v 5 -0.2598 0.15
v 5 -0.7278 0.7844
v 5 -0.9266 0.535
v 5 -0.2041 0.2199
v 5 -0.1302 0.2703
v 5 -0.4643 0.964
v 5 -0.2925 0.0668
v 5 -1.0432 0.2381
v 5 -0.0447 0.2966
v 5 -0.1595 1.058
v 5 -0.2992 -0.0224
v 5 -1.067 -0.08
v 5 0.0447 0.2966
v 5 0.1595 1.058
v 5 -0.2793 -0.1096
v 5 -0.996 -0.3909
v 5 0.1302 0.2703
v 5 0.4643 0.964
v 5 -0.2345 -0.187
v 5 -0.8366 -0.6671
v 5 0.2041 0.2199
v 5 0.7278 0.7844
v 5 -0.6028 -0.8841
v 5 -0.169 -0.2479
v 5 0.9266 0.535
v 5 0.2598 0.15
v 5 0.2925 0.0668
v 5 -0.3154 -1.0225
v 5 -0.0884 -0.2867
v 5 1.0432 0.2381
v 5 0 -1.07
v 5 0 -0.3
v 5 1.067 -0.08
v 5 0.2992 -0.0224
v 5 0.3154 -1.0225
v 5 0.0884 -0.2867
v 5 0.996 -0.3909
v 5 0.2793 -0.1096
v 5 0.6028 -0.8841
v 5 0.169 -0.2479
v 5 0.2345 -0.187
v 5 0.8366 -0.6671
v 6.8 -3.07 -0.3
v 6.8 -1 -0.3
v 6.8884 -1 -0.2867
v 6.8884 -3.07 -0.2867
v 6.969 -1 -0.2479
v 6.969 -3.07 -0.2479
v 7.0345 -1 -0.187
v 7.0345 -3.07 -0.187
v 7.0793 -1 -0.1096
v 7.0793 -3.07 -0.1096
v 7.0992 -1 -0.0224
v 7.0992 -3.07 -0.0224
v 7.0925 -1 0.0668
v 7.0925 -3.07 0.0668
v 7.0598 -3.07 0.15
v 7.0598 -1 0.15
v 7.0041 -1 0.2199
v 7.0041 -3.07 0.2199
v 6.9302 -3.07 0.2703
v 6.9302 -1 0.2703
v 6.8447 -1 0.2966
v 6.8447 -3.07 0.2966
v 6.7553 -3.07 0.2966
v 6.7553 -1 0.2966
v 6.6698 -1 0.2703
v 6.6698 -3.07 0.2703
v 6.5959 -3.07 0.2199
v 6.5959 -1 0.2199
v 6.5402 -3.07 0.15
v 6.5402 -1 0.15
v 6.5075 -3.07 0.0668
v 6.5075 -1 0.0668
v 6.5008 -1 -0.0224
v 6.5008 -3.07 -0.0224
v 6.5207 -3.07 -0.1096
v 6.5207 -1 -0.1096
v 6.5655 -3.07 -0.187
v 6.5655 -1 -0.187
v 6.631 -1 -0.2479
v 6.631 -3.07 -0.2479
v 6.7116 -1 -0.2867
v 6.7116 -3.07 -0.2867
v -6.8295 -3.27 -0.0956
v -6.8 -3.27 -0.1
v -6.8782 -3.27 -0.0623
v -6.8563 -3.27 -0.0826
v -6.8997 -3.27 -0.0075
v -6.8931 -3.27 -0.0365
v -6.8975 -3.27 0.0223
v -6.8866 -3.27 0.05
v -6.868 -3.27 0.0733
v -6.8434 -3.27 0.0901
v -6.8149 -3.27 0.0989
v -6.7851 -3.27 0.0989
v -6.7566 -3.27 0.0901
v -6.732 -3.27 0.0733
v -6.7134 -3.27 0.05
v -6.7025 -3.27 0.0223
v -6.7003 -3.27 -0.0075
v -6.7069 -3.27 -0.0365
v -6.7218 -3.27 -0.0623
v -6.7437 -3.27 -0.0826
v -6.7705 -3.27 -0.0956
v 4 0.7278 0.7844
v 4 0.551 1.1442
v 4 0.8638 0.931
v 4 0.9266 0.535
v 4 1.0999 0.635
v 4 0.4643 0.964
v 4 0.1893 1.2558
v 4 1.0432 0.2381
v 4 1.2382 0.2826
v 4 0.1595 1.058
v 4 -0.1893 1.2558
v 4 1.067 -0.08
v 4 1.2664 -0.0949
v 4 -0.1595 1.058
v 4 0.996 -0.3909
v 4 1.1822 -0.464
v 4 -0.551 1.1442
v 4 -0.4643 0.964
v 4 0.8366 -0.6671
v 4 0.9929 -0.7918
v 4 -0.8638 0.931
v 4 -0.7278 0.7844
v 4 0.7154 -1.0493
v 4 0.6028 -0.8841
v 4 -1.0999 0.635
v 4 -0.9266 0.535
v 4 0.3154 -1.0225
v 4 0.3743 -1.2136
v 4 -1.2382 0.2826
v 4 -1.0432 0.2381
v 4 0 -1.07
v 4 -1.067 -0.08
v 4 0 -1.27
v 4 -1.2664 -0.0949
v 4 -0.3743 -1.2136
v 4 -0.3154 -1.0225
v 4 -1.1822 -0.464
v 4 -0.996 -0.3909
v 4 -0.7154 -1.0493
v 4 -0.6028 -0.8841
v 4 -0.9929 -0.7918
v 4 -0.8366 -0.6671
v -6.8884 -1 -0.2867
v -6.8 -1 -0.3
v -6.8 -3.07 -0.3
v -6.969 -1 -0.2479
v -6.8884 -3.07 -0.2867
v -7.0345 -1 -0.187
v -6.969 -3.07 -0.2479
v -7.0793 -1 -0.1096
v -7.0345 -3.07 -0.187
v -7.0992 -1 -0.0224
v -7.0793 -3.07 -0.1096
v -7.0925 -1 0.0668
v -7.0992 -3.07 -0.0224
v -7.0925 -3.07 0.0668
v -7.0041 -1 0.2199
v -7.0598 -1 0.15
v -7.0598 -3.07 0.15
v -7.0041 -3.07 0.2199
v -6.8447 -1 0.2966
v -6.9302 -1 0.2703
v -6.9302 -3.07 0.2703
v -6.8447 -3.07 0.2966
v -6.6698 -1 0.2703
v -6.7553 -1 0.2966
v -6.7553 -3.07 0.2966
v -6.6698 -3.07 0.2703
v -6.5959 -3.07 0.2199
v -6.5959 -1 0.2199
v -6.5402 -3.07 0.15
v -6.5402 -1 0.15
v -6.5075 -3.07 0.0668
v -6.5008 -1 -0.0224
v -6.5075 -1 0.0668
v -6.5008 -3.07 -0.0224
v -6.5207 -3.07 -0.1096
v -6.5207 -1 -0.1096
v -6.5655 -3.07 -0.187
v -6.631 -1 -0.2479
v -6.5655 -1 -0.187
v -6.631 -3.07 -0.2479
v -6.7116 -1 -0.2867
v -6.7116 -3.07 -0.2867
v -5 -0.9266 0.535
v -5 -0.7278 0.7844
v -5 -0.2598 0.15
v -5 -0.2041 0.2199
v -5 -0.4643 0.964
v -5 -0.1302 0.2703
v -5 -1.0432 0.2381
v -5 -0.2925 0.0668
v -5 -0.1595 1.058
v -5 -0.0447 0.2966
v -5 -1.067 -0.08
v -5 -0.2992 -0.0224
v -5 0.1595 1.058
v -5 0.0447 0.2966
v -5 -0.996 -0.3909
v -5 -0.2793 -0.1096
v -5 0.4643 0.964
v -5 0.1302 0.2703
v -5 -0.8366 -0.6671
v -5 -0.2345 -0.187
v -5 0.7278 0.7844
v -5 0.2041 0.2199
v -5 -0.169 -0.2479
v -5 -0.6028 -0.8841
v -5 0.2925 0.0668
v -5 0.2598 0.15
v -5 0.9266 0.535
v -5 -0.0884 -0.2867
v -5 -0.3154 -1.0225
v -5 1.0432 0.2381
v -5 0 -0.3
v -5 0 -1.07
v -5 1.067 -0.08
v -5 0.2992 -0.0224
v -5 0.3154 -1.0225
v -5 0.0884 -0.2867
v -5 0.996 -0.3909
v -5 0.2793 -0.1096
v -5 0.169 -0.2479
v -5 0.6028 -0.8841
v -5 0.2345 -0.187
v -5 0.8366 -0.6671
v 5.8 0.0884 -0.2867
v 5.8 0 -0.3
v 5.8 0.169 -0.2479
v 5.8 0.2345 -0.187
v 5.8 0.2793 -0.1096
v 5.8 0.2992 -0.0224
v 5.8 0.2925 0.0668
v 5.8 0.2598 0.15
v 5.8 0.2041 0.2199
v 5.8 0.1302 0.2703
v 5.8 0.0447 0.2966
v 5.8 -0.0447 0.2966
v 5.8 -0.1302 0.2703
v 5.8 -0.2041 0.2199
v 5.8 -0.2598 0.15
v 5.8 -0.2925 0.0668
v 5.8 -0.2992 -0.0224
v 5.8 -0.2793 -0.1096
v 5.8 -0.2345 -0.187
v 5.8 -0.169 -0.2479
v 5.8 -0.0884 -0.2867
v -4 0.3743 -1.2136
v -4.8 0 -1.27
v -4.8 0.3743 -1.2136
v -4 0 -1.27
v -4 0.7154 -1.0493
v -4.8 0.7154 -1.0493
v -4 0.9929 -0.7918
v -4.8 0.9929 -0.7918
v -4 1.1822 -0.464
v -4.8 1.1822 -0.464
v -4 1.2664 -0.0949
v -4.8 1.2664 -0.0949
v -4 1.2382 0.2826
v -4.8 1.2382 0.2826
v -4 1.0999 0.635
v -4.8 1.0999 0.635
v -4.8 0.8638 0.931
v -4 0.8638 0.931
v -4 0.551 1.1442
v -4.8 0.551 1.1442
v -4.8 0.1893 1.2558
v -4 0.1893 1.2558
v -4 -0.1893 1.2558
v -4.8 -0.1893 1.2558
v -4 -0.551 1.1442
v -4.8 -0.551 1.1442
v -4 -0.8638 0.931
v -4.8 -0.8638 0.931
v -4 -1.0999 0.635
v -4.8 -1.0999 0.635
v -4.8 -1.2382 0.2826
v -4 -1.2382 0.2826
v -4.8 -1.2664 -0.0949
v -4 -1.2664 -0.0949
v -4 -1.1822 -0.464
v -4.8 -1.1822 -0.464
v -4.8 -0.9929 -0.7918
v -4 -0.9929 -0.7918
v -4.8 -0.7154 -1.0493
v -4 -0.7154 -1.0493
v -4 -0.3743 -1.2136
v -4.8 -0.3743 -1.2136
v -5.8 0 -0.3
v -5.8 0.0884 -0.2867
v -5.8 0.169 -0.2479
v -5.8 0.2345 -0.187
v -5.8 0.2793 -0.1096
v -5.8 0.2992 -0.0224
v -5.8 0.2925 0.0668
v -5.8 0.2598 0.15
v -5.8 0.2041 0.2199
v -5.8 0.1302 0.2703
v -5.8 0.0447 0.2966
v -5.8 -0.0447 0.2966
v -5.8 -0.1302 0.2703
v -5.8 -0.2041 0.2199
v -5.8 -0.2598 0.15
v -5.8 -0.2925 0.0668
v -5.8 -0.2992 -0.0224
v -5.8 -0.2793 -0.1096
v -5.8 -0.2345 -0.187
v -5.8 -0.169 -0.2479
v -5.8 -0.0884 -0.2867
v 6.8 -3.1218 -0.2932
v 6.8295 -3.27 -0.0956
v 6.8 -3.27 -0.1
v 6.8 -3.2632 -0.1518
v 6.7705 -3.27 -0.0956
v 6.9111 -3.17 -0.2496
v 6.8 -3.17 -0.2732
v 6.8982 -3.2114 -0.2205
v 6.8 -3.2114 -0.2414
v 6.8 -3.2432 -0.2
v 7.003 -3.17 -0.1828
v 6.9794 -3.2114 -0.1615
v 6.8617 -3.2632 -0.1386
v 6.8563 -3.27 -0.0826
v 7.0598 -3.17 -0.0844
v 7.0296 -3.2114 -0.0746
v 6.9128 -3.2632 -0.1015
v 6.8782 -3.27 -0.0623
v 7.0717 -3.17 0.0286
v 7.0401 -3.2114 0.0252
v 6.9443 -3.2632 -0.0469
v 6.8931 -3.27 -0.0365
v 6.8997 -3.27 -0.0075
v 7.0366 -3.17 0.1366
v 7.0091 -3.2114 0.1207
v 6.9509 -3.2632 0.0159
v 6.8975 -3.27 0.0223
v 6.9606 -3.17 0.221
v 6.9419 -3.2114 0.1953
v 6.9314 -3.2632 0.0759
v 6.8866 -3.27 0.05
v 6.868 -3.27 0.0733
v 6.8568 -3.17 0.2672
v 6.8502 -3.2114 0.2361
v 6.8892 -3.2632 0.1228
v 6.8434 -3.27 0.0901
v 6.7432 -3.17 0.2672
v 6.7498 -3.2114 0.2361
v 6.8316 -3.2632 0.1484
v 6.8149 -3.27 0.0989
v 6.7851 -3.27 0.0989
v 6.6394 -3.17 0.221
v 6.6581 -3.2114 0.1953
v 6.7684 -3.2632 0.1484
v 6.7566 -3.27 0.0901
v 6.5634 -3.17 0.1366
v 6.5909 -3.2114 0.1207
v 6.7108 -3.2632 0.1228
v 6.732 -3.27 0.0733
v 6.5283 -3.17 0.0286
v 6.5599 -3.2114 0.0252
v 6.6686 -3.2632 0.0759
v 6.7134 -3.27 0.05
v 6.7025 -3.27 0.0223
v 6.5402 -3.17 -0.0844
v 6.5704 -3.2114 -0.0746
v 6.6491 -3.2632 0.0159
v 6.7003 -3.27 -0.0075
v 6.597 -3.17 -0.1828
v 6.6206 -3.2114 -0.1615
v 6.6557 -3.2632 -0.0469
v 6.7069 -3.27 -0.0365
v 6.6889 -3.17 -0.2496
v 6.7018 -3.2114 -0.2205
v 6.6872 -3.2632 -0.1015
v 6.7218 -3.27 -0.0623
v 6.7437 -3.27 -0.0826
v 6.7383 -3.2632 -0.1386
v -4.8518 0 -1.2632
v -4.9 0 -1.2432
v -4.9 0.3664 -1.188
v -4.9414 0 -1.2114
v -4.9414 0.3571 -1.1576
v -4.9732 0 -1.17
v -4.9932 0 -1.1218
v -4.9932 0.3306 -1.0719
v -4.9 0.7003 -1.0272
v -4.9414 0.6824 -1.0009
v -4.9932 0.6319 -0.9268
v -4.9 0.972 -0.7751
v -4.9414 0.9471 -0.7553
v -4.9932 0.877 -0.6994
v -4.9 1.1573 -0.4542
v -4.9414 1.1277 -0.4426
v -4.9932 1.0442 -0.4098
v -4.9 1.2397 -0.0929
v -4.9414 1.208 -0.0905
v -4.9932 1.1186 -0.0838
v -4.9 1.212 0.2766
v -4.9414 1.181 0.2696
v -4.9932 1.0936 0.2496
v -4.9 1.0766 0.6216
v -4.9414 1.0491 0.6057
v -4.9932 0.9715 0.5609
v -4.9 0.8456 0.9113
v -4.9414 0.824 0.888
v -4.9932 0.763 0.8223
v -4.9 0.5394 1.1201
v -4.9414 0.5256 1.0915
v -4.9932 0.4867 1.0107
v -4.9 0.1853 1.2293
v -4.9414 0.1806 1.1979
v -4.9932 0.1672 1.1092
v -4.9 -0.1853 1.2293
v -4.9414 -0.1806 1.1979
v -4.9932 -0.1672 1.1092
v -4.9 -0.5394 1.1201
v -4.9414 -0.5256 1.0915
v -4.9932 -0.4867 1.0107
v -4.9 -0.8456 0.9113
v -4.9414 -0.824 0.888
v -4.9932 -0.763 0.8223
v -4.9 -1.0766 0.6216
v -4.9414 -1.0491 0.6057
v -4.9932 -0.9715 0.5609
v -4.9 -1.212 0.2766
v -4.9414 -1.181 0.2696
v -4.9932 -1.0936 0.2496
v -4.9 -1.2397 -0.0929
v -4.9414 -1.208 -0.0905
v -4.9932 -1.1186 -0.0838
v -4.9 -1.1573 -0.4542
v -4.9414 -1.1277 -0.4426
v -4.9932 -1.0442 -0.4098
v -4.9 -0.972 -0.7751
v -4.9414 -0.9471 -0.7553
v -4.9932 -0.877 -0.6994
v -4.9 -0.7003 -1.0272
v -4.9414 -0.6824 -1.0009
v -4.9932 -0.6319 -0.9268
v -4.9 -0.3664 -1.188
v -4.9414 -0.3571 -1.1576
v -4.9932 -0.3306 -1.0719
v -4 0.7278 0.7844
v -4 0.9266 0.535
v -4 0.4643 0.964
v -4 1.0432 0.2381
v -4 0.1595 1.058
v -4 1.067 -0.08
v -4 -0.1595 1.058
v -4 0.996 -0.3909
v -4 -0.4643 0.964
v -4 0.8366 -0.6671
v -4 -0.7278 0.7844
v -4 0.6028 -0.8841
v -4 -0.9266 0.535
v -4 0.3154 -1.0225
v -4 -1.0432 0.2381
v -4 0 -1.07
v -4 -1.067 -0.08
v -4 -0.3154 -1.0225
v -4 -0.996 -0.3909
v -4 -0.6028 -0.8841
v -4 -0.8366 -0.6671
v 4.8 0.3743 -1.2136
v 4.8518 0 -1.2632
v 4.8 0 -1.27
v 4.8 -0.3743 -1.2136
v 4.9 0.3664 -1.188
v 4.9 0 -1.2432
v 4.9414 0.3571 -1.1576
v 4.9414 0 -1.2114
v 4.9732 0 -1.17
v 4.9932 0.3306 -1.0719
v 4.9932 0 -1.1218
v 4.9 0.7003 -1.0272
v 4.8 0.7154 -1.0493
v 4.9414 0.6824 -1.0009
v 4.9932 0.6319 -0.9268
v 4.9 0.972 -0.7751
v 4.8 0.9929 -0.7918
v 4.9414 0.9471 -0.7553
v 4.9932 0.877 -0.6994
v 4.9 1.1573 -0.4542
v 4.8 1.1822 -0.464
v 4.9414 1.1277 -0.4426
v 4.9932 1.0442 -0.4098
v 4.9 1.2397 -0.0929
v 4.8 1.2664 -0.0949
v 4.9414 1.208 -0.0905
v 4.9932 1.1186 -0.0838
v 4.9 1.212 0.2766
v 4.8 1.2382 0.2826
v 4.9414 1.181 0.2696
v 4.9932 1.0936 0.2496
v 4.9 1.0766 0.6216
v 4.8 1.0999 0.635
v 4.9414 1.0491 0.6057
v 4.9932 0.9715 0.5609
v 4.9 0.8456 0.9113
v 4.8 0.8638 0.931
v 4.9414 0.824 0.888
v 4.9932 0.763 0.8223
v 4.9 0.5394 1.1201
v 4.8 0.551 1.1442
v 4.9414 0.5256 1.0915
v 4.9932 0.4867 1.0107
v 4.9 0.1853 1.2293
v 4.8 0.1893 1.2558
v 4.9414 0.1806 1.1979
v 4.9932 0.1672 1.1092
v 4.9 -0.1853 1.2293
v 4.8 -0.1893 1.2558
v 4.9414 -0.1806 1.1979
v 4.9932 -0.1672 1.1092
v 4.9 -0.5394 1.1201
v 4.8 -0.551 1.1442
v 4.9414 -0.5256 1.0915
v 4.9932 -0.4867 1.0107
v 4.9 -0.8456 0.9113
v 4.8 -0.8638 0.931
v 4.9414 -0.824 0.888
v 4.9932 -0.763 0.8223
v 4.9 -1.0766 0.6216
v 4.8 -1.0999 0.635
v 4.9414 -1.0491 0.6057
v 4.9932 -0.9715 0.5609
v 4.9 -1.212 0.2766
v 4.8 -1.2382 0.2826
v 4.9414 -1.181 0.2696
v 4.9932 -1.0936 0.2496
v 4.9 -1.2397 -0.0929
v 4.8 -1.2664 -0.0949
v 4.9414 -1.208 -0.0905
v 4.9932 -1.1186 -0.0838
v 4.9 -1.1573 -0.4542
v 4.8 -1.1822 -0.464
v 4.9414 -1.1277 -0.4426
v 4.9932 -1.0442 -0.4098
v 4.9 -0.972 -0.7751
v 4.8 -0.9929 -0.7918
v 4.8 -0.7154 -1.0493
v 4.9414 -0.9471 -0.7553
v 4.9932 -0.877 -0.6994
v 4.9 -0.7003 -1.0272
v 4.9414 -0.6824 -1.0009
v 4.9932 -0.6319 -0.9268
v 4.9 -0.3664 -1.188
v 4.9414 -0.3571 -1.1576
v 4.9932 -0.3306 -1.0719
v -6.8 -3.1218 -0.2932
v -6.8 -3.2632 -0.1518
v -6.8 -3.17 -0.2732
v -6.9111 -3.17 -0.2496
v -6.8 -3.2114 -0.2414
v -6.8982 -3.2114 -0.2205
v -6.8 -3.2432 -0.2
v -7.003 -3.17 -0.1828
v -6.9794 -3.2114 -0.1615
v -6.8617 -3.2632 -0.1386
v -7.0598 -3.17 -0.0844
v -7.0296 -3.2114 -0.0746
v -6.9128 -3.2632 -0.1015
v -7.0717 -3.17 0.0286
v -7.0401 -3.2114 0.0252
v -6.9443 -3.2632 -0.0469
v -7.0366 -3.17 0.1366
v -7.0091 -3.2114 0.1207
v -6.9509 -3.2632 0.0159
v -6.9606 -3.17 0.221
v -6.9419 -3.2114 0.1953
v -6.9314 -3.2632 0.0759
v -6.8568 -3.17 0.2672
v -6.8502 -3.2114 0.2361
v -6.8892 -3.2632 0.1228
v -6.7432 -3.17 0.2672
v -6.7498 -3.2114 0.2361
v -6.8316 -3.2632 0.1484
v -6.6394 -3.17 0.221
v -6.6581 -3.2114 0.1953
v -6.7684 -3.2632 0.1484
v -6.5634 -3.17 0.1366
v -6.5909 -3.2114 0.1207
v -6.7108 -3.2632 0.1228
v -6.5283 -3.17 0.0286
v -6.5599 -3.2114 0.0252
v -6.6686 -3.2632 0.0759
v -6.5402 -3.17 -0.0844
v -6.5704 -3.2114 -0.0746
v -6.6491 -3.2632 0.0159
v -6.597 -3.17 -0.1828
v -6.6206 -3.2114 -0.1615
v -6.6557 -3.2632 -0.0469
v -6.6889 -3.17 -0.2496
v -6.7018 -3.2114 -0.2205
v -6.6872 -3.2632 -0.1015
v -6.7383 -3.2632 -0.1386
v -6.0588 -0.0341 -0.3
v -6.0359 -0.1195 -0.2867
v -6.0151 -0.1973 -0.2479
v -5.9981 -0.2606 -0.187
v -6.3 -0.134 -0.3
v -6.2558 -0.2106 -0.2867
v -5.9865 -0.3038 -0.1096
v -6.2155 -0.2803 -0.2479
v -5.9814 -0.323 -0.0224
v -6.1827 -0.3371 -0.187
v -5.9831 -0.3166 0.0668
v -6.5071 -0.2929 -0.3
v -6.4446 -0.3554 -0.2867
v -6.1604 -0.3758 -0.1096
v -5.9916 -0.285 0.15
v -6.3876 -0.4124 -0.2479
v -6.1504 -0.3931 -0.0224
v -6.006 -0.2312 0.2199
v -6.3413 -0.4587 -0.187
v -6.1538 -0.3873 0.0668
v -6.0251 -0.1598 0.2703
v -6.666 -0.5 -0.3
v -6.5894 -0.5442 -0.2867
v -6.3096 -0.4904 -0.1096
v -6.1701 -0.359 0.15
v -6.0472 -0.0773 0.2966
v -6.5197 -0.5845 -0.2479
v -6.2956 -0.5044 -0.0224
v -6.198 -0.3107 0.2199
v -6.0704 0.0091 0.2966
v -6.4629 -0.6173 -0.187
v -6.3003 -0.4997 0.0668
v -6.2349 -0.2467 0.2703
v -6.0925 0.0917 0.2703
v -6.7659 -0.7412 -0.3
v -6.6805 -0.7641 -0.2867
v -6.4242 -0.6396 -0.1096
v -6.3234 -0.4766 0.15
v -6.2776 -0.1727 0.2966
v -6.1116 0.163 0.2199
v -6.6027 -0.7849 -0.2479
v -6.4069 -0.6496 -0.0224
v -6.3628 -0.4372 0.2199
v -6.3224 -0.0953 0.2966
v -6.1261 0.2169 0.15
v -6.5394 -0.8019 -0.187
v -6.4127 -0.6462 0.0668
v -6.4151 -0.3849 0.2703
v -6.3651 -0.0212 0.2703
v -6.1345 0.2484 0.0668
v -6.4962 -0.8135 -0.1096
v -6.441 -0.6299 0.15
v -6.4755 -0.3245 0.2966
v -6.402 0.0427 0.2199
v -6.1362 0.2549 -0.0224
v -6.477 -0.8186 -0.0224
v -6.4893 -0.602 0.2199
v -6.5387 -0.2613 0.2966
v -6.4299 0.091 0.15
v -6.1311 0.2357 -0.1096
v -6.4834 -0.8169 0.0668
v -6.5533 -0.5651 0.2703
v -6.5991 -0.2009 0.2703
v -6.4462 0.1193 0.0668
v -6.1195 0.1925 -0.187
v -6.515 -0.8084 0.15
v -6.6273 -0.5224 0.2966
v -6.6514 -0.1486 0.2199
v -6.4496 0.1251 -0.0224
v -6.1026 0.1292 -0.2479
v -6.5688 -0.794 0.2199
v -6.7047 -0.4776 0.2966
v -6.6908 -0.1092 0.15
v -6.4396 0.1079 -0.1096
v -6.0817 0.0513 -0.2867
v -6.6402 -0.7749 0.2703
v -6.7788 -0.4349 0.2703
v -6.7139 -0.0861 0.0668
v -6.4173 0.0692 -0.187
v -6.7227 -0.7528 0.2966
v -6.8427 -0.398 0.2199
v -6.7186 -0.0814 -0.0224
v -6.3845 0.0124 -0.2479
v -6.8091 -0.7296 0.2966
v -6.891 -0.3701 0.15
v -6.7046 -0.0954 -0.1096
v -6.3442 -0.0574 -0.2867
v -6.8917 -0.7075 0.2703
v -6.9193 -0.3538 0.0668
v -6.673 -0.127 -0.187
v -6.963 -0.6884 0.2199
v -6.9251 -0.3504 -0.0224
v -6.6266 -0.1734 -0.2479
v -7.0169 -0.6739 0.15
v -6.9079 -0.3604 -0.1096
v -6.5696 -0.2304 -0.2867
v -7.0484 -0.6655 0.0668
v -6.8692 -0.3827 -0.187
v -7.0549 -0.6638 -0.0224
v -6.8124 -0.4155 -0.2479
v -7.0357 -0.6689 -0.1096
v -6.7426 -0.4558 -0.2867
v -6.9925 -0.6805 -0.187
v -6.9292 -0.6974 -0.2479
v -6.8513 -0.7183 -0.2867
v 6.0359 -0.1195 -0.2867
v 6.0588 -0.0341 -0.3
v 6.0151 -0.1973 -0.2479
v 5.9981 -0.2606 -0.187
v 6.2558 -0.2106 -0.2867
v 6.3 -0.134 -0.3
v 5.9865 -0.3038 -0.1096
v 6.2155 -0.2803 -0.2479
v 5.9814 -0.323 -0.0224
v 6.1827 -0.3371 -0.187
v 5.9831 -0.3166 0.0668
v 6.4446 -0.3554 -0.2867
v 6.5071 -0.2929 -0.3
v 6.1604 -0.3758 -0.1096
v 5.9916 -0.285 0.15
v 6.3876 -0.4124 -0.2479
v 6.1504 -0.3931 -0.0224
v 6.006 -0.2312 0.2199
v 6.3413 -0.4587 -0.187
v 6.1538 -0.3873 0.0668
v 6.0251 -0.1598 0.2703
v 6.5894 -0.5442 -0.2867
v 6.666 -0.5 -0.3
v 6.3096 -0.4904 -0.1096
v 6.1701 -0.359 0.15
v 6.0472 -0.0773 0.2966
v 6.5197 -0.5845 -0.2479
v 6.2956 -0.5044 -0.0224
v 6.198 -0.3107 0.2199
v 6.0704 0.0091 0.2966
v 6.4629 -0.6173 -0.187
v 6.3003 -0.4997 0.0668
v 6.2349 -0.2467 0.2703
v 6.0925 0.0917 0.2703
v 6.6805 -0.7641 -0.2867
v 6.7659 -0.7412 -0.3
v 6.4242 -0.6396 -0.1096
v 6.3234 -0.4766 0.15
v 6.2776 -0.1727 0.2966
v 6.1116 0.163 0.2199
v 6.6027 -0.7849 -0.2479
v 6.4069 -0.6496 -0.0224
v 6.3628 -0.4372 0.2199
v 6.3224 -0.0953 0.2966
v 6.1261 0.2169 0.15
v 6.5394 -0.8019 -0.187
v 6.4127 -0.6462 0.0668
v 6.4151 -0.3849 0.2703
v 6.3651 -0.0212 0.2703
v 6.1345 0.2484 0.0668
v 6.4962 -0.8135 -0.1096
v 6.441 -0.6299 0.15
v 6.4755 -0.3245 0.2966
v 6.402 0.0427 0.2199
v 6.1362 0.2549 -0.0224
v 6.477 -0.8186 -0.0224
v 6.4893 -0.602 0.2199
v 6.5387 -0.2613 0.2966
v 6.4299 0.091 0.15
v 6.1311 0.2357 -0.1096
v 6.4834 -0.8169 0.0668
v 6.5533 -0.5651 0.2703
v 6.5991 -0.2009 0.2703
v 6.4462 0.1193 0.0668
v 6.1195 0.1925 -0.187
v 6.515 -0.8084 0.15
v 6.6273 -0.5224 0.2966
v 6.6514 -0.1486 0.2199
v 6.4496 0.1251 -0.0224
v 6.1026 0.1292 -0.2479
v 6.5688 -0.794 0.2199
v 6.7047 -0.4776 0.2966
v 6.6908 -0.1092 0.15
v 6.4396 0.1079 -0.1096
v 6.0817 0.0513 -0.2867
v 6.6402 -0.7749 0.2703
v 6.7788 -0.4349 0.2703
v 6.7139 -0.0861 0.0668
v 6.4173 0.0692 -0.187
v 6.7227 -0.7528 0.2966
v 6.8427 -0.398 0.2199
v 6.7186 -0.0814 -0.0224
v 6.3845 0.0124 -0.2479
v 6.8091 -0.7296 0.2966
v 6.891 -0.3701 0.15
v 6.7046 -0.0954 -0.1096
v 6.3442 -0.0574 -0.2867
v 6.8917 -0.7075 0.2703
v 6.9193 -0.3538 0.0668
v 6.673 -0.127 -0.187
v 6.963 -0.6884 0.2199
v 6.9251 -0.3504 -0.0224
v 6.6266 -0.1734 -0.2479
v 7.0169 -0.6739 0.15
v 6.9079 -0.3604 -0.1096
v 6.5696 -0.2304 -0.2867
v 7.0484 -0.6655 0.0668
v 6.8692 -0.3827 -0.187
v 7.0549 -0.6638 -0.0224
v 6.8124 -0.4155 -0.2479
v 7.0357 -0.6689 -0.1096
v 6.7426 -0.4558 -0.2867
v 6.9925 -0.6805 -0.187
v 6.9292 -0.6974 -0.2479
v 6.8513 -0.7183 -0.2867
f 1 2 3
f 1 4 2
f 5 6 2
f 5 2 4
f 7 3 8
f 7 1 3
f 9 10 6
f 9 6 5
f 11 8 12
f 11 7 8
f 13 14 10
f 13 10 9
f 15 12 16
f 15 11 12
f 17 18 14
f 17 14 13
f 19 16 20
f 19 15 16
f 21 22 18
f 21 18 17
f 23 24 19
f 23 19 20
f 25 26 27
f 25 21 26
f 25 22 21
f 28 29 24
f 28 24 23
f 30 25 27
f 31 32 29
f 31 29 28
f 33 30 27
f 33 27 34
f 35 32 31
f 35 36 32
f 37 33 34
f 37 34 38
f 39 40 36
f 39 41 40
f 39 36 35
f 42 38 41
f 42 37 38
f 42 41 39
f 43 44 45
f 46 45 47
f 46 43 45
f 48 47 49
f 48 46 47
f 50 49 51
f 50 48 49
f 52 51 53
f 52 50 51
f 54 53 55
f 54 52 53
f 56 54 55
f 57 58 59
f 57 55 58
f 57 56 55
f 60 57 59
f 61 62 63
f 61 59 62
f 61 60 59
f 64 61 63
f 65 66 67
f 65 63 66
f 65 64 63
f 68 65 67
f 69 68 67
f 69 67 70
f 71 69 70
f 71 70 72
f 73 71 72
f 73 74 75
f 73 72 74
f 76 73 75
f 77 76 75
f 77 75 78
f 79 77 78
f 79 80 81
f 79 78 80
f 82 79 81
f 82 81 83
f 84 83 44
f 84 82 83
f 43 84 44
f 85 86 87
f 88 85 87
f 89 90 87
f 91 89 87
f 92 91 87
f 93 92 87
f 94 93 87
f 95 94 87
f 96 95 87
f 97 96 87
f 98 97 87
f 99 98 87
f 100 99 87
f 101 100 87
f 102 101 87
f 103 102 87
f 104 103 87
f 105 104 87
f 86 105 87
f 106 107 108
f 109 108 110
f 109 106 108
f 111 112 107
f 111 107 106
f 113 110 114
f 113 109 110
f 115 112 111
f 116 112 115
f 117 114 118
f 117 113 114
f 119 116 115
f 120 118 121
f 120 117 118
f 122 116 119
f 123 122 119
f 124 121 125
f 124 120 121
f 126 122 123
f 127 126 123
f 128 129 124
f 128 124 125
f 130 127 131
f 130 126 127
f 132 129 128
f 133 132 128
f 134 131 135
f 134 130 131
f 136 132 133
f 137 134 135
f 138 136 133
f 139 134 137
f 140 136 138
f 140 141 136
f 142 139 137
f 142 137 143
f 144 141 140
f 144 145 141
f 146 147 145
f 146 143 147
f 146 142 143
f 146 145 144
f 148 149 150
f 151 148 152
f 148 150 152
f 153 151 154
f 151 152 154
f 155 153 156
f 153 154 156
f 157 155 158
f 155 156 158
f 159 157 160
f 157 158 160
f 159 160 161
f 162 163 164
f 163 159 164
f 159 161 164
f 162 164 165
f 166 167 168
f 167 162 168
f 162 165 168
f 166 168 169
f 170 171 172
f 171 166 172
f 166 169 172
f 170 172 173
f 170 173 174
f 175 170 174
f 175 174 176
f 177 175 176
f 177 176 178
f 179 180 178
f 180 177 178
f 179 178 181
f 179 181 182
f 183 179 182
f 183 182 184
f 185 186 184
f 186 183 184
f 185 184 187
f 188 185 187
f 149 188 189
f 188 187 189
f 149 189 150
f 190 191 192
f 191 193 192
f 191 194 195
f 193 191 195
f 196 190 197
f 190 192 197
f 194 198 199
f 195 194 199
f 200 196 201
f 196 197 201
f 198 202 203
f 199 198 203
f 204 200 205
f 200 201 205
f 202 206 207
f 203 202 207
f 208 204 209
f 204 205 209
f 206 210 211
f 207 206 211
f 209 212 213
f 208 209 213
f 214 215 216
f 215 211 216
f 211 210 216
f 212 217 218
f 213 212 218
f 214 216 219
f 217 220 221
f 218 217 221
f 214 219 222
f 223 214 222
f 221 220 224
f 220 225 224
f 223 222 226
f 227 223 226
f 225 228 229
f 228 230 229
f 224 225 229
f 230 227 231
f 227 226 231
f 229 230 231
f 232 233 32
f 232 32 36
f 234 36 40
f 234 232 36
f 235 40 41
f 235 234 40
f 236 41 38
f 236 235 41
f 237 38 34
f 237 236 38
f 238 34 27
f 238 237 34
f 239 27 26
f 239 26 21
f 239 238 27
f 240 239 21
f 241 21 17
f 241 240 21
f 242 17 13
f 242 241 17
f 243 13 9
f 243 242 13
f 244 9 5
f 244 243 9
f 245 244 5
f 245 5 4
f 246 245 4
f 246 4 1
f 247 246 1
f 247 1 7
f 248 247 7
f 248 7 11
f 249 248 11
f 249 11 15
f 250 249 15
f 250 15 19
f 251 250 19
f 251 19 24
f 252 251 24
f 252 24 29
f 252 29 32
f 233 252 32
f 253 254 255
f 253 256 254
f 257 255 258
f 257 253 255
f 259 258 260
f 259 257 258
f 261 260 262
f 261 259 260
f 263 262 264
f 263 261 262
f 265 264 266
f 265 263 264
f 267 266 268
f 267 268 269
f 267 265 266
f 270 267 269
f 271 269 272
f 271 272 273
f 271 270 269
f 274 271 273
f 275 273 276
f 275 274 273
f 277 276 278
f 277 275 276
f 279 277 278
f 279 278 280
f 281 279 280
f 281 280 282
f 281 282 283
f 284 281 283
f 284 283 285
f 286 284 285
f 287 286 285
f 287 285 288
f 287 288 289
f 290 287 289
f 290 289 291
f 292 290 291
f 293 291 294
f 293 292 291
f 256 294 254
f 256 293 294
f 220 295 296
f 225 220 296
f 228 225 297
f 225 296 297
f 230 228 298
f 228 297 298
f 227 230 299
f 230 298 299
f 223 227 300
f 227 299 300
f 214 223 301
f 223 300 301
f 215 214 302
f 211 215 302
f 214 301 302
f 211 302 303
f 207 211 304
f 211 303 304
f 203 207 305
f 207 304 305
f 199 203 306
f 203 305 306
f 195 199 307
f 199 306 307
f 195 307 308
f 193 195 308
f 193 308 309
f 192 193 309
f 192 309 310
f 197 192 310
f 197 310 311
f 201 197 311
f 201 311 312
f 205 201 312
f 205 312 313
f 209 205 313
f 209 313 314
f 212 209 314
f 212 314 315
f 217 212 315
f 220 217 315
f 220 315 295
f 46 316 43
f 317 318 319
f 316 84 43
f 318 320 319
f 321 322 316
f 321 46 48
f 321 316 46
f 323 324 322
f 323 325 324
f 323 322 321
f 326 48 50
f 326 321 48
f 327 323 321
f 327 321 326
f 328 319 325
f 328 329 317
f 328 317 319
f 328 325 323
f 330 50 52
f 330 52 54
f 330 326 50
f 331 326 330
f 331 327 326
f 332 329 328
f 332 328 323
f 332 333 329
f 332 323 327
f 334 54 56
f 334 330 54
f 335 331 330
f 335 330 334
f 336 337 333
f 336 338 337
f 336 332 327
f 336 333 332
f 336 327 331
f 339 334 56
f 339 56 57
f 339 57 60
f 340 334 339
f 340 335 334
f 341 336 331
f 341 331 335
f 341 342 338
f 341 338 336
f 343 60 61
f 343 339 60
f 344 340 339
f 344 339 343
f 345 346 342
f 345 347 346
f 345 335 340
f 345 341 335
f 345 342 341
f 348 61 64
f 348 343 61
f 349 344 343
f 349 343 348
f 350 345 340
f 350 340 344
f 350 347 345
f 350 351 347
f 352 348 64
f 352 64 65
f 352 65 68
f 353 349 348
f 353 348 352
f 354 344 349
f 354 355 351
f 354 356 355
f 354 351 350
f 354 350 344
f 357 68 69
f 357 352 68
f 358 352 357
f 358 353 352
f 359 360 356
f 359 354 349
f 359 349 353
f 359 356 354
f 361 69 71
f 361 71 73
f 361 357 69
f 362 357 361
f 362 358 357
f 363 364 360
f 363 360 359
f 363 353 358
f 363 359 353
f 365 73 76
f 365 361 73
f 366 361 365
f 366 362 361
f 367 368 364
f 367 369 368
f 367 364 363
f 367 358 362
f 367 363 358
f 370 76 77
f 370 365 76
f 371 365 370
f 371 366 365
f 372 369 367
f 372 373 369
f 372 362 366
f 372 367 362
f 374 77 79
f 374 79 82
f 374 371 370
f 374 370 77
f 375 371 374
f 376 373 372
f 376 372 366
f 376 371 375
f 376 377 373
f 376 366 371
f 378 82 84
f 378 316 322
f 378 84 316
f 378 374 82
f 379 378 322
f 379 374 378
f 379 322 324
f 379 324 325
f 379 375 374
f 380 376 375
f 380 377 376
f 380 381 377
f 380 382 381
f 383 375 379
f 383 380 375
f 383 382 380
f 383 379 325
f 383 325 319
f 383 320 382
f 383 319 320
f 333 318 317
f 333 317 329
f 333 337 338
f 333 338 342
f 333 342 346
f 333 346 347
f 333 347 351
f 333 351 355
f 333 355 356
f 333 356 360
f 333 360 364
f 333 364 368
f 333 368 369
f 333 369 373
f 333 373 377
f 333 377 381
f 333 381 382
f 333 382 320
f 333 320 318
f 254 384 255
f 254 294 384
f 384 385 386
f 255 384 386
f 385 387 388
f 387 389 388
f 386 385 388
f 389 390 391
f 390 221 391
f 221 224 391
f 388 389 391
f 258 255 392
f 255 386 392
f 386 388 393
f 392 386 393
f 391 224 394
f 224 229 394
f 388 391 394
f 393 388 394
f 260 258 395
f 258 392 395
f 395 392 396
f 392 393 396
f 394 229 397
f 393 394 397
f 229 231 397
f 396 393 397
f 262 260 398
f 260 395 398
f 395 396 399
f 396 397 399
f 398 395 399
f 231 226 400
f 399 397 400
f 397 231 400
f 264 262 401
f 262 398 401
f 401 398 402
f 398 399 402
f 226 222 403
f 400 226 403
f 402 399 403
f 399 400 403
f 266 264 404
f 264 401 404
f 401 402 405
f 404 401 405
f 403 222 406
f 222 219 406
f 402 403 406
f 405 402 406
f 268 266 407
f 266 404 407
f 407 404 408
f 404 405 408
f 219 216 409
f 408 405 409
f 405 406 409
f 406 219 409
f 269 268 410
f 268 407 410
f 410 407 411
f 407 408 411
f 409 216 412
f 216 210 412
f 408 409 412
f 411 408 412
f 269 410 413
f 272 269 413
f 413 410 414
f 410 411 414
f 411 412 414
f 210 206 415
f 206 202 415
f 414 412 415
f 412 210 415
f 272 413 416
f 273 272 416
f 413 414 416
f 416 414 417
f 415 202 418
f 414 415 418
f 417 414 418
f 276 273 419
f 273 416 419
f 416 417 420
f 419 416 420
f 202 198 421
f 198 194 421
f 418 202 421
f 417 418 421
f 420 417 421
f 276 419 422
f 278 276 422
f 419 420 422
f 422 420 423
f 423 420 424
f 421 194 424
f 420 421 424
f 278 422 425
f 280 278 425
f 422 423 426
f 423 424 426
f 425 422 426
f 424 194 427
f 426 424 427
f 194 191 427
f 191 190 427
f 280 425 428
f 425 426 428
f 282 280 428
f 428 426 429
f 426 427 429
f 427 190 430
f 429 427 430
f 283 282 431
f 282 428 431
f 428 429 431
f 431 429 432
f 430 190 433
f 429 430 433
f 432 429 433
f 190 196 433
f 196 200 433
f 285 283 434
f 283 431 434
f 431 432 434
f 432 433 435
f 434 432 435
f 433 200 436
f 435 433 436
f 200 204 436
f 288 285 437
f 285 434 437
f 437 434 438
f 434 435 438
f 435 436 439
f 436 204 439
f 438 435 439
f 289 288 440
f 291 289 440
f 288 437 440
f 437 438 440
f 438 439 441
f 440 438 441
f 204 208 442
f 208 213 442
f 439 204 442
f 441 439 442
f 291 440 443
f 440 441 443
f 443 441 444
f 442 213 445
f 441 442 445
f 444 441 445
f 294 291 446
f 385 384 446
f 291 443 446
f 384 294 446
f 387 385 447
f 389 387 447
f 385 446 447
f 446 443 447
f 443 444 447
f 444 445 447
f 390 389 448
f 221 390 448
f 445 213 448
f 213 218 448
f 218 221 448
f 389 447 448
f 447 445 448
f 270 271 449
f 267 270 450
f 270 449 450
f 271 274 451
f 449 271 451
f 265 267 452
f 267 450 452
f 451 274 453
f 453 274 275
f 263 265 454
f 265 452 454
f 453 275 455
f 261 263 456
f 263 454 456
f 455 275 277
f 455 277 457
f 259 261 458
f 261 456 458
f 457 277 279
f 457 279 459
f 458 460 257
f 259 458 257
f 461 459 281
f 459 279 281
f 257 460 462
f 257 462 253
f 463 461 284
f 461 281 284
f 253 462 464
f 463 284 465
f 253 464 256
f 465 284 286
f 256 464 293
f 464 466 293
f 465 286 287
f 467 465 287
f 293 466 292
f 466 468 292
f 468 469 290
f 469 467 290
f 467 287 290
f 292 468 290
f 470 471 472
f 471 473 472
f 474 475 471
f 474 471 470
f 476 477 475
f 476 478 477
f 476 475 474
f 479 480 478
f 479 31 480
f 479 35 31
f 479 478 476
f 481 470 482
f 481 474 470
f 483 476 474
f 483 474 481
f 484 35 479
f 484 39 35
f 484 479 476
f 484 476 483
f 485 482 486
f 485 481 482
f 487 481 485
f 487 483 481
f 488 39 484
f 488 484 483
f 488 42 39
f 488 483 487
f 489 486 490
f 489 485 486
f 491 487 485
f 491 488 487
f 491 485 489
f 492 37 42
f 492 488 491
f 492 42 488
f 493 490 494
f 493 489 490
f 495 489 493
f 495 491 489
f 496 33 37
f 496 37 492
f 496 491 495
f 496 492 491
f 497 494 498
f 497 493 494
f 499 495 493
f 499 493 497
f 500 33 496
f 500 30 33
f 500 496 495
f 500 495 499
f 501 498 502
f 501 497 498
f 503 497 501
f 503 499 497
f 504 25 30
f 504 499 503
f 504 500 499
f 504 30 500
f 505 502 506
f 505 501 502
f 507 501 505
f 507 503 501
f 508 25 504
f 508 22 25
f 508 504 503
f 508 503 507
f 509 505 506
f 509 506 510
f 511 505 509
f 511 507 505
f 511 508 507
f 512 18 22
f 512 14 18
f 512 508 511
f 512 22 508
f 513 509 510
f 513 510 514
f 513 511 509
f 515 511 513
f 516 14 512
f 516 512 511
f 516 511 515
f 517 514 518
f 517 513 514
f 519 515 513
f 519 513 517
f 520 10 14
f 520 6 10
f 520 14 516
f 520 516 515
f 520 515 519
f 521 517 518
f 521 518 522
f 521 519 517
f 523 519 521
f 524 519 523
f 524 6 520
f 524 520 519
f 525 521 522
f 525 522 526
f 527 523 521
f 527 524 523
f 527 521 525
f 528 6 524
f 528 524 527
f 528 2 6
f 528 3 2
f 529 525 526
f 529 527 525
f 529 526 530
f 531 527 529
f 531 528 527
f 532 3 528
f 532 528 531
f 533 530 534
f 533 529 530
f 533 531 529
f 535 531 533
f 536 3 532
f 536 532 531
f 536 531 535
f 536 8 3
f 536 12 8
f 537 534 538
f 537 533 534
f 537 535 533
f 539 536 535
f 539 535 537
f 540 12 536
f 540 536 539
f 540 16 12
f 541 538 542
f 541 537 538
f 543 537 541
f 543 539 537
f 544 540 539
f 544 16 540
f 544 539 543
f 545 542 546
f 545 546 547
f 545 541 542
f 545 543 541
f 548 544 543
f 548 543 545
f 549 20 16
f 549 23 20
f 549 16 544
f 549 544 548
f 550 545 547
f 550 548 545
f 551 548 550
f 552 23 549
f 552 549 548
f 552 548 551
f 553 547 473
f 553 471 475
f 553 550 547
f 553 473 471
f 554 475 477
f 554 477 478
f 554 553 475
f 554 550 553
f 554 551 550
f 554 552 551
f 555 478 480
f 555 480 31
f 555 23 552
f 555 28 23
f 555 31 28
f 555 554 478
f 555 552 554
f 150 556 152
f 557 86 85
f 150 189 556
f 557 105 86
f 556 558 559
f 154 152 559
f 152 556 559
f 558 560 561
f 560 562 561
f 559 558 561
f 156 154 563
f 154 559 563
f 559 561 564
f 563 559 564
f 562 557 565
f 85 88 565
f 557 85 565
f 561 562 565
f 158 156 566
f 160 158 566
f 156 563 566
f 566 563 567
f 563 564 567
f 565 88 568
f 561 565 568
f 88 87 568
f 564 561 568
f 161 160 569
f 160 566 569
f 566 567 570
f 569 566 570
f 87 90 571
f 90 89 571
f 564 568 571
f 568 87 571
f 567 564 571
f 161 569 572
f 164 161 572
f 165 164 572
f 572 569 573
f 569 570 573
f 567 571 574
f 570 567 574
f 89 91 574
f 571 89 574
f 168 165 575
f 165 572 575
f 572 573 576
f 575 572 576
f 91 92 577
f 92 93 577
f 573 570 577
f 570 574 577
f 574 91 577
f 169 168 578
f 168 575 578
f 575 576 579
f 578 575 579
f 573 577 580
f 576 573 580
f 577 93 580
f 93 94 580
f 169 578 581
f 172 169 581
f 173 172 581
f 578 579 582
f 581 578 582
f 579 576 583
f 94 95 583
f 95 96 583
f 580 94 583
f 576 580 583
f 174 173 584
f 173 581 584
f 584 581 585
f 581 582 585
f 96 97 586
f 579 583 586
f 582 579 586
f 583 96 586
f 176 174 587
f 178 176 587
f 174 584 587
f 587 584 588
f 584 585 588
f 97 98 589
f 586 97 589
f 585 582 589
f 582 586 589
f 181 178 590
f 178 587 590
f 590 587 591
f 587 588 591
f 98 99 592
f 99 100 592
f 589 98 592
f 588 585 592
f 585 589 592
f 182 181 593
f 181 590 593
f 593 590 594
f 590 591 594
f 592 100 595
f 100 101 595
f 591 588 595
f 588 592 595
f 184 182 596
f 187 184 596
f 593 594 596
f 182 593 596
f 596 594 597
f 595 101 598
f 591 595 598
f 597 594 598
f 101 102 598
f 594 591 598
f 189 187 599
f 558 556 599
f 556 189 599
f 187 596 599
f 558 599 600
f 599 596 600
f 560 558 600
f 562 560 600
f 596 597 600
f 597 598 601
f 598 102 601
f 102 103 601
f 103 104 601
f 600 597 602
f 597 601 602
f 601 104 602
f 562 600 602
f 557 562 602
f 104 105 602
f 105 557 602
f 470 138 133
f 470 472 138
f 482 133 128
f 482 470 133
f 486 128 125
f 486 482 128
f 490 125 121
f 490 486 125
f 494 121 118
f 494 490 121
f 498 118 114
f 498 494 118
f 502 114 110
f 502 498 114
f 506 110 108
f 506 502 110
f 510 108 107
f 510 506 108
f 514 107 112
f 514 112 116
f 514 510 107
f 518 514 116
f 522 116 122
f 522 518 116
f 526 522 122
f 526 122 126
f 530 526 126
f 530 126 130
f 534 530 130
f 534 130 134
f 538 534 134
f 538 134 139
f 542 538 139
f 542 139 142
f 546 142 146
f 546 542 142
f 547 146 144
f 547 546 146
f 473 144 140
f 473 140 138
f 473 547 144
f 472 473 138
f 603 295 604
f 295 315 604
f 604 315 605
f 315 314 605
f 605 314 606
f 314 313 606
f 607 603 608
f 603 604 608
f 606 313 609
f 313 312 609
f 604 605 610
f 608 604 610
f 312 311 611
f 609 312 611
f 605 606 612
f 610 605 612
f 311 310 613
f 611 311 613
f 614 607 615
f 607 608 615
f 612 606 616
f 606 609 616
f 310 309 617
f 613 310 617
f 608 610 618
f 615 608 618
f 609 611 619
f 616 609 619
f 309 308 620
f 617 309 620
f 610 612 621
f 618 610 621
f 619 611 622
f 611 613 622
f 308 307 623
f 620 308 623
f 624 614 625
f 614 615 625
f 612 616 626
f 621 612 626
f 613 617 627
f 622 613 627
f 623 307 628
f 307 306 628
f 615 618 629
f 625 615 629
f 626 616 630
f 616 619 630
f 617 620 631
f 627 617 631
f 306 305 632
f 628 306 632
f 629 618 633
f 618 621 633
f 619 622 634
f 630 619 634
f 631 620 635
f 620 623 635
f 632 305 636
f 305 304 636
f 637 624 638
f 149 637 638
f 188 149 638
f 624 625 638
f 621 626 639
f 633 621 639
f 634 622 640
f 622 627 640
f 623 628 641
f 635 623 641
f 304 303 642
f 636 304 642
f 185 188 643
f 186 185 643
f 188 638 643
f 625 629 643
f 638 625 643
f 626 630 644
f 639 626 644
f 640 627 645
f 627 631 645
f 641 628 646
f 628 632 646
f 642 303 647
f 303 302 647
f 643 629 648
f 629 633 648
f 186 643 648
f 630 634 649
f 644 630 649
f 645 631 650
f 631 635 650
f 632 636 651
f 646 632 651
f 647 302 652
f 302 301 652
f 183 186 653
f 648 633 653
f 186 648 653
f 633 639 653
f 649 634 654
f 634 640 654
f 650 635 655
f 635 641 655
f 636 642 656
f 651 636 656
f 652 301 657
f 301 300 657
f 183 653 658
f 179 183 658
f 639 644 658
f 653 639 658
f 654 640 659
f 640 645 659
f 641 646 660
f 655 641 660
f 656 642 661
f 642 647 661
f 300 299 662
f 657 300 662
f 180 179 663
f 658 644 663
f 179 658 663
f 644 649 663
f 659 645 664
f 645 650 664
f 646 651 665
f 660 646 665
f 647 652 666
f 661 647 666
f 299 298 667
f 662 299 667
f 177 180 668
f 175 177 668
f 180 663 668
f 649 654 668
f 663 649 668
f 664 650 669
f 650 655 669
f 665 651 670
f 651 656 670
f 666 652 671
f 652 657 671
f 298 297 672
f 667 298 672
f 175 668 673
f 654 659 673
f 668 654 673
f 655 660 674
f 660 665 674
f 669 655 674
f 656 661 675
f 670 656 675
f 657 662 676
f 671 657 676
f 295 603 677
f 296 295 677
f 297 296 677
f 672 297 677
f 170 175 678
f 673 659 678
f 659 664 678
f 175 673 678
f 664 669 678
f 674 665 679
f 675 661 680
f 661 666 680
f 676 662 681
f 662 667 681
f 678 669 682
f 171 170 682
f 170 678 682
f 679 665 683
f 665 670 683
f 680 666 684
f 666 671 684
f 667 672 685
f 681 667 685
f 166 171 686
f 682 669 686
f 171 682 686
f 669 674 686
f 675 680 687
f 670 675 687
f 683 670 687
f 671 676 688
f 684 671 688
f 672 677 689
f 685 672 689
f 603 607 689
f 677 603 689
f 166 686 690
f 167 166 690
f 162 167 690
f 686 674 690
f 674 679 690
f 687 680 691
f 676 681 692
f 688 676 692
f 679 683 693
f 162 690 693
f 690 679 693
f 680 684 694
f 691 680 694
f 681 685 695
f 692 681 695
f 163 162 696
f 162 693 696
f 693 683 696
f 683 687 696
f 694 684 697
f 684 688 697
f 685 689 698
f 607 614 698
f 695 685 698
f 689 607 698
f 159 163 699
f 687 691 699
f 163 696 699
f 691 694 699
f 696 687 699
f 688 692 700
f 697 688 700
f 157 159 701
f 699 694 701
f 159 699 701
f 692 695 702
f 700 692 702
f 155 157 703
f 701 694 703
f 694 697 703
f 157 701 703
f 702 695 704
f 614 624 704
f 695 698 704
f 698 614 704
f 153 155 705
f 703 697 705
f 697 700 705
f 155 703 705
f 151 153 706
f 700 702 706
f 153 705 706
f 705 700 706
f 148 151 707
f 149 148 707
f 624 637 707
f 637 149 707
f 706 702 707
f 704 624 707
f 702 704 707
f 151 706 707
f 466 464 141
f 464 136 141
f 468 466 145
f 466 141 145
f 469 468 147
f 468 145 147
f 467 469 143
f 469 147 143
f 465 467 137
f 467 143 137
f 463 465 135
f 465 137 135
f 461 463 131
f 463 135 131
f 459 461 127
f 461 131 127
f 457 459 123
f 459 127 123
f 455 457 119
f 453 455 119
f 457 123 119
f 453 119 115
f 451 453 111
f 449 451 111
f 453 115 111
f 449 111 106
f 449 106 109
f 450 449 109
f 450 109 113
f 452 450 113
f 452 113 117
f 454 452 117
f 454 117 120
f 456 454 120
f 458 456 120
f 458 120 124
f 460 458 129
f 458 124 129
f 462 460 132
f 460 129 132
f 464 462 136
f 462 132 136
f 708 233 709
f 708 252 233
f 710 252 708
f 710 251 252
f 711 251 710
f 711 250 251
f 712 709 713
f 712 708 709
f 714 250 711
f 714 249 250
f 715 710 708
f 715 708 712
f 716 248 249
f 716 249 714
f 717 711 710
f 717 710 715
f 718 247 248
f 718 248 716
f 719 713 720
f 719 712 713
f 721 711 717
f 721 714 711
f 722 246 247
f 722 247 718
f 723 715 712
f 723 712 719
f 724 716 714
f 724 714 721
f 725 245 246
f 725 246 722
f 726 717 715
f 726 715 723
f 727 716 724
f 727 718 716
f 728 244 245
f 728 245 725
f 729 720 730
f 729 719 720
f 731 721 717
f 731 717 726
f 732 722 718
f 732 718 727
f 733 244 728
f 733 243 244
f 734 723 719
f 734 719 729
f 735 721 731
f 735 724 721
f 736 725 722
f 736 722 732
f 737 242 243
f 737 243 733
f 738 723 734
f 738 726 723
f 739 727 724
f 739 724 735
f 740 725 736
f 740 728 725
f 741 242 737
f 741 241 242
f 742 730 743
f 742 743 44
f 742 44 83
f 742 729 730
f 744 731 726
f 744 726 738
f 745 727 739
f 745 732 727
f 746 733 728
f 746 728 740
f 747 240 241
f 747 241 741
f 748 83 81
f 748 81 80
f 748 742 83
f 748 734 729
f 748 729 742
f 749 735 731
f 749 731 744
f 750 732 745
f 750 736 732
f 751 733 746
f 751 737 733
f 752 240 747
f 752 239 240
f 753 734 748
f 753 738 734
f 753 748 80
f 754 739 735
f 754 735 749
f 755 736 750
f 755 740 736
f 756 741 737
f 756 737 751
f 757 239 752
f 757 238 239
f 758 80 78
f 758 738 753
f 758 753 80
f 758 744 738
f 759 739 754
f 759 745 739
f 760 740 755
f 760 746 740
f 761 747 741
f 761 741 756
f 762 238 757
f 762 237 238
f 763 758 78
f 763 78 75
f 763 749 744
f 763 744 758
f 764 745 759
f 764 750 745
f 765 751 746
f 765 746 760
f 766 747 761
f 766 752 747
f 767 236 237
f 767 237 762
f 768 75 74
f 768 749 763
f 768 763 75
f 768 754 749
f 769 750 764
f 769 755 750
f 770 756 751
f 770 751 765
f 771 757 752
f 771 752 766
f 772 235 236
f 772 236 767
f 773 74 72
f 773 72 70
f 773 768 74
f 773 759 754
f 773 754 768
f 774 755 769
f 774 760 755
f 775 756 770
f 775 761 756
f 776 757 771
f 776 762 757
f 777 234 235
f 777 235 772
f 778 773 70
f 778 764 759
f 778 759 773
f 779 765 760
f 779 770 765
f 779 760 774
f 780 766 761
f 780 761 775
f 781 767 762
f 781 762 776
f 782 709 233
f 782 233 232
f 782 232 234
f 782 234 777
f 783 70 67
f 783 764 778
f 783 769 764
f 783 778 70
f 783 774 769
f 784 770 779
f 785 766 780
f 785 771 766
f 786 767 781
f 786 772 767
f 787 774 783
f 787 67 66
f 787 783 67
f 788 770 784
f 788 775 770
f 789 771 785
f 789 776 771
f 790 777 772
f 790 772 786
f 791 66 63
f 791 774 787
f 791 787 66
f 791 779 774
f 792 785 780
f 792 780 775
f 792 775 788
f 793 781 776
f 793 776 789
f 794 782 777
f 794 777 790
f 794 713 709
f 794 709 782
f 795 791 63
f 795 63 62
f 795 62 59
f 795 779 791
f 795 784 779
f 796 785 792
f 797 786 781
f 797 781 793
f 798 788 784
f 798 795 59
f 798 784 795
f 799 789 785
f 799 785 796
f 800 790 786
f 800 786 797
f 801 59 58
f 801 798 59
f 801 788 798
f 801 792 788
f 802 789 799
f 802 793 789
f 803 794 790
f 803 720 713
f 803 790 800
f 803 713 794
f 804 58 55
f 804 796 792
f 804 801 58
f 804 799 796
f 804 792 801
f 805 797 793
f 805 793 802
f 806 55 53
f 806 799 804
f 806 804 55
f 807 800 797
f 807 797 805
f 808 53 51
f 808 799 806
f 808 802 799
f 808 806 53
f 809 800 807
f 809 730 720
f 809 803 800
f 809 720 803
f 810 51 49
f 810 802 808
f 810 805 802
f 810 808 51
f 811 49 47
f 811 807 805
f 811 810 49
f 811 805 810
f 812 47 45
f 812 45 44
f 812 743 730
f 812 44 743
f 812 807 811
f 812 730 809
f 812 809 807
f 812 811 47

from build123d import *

# Parameters (mm, degrees)
SKETCH_1_R             = 1.27
EXTRUDE_1_DEPTH        = 5
FILLET_1_R             = 0.2
SKETCH_2_R             = 0.3
FILLET_2_R             = 0.2
FILLET_2_OF_MIRROR_1_R = 0.2
SKETCH_6_W             = 8
SKETCH_6_H             = 0.981075476


with BuildPart() as part:
    # 草图1 → 凸台-拉伸1 (new, symmetric)
    with BuildSketch(Plane(origin=(0, 0, 0), x_dir=(0, 0, -1), z_dir=(1, 0, 0))):
        Circle(SKETCH_1_R)
    extrude(amount=EXTRUDE_1_DEPTH, both=True)

    # 圆角1
    fillet_1_edges = [part.edges().sort_by_distance(p)[0] for p in [
        (-5, 0, 1.27),
        (5, 0, 1.27),
    ]]
    fillet(fillet_1_edges, radius=FILLET_1_R)

    # 扫描1: sweep along a path in 草图3
    with BuildLine(Plane.XY) as sweep_1_path:
        Line((5, 0), (5.8, 0))
        ThreePointArc((5.8, 0), (6.507106781, -0.292893219), (6.8, -1))
        Line((6.8, -1), (6.8, -3.27))
    # 草图2 → 扫描1 (sweep)
    with BuildSketch(Plane(origin=(5, 0, 0), x_dir=(0, 0, -1), z_dir=(1, 0, 0))):
        Circle(SKETCH_2_R)
    sweep_1 = sweep(path=sweep_1_path.line)

    # 圆角2
    fillet_2_edges = [part.edges().sort_by_distance(p)[0] for p in [
        (6.8, -3.27, 0.3),
    ]]
    fillet(fillet_2_edges, radius=FILLET_2_R)

    # 镜向1: 扫描1 across plane
    add(sweep_1.mirror(Plane(origin=(0, 0, 0), x_dir=(0, 0, 1), z_dir=(1, 0, 0))))

    # 圆角2 of 镜向1
    fillet_2_of_mirror_1_edges = [part.edges().sort_by_distance(p)[0] for p in [
        (-6.8, -3.27, 0.3),
    ]]
    fillet(fillet_2_of_mirror_1_edges, radius=FILLET_2_OF_MIRROR_1_R)

    # 草图6 → 切除-旋转2 (revolve, cut)
    with BuildSketch(Plane(origin=(0, 0, 0), x_dir=(1, 0, 0), z_dir=(0, 1, 0)), mode=Mode.PRIVATE) as cut_revolve_2_sk:
        with Locations((0, -1.560537738)):
            Rectangle(SKETCH_6_W, SKETCH_6_H)
    revolve(cut_revolve_2_sk.sketch.rotate(Axis((7.81, 0, 0), (-1, 0, 0)), 180), axis=Axis((7.81, 0, 0), (-1, 0, 0)), mode=Mode.SUBTRACT)


solid = part.part
